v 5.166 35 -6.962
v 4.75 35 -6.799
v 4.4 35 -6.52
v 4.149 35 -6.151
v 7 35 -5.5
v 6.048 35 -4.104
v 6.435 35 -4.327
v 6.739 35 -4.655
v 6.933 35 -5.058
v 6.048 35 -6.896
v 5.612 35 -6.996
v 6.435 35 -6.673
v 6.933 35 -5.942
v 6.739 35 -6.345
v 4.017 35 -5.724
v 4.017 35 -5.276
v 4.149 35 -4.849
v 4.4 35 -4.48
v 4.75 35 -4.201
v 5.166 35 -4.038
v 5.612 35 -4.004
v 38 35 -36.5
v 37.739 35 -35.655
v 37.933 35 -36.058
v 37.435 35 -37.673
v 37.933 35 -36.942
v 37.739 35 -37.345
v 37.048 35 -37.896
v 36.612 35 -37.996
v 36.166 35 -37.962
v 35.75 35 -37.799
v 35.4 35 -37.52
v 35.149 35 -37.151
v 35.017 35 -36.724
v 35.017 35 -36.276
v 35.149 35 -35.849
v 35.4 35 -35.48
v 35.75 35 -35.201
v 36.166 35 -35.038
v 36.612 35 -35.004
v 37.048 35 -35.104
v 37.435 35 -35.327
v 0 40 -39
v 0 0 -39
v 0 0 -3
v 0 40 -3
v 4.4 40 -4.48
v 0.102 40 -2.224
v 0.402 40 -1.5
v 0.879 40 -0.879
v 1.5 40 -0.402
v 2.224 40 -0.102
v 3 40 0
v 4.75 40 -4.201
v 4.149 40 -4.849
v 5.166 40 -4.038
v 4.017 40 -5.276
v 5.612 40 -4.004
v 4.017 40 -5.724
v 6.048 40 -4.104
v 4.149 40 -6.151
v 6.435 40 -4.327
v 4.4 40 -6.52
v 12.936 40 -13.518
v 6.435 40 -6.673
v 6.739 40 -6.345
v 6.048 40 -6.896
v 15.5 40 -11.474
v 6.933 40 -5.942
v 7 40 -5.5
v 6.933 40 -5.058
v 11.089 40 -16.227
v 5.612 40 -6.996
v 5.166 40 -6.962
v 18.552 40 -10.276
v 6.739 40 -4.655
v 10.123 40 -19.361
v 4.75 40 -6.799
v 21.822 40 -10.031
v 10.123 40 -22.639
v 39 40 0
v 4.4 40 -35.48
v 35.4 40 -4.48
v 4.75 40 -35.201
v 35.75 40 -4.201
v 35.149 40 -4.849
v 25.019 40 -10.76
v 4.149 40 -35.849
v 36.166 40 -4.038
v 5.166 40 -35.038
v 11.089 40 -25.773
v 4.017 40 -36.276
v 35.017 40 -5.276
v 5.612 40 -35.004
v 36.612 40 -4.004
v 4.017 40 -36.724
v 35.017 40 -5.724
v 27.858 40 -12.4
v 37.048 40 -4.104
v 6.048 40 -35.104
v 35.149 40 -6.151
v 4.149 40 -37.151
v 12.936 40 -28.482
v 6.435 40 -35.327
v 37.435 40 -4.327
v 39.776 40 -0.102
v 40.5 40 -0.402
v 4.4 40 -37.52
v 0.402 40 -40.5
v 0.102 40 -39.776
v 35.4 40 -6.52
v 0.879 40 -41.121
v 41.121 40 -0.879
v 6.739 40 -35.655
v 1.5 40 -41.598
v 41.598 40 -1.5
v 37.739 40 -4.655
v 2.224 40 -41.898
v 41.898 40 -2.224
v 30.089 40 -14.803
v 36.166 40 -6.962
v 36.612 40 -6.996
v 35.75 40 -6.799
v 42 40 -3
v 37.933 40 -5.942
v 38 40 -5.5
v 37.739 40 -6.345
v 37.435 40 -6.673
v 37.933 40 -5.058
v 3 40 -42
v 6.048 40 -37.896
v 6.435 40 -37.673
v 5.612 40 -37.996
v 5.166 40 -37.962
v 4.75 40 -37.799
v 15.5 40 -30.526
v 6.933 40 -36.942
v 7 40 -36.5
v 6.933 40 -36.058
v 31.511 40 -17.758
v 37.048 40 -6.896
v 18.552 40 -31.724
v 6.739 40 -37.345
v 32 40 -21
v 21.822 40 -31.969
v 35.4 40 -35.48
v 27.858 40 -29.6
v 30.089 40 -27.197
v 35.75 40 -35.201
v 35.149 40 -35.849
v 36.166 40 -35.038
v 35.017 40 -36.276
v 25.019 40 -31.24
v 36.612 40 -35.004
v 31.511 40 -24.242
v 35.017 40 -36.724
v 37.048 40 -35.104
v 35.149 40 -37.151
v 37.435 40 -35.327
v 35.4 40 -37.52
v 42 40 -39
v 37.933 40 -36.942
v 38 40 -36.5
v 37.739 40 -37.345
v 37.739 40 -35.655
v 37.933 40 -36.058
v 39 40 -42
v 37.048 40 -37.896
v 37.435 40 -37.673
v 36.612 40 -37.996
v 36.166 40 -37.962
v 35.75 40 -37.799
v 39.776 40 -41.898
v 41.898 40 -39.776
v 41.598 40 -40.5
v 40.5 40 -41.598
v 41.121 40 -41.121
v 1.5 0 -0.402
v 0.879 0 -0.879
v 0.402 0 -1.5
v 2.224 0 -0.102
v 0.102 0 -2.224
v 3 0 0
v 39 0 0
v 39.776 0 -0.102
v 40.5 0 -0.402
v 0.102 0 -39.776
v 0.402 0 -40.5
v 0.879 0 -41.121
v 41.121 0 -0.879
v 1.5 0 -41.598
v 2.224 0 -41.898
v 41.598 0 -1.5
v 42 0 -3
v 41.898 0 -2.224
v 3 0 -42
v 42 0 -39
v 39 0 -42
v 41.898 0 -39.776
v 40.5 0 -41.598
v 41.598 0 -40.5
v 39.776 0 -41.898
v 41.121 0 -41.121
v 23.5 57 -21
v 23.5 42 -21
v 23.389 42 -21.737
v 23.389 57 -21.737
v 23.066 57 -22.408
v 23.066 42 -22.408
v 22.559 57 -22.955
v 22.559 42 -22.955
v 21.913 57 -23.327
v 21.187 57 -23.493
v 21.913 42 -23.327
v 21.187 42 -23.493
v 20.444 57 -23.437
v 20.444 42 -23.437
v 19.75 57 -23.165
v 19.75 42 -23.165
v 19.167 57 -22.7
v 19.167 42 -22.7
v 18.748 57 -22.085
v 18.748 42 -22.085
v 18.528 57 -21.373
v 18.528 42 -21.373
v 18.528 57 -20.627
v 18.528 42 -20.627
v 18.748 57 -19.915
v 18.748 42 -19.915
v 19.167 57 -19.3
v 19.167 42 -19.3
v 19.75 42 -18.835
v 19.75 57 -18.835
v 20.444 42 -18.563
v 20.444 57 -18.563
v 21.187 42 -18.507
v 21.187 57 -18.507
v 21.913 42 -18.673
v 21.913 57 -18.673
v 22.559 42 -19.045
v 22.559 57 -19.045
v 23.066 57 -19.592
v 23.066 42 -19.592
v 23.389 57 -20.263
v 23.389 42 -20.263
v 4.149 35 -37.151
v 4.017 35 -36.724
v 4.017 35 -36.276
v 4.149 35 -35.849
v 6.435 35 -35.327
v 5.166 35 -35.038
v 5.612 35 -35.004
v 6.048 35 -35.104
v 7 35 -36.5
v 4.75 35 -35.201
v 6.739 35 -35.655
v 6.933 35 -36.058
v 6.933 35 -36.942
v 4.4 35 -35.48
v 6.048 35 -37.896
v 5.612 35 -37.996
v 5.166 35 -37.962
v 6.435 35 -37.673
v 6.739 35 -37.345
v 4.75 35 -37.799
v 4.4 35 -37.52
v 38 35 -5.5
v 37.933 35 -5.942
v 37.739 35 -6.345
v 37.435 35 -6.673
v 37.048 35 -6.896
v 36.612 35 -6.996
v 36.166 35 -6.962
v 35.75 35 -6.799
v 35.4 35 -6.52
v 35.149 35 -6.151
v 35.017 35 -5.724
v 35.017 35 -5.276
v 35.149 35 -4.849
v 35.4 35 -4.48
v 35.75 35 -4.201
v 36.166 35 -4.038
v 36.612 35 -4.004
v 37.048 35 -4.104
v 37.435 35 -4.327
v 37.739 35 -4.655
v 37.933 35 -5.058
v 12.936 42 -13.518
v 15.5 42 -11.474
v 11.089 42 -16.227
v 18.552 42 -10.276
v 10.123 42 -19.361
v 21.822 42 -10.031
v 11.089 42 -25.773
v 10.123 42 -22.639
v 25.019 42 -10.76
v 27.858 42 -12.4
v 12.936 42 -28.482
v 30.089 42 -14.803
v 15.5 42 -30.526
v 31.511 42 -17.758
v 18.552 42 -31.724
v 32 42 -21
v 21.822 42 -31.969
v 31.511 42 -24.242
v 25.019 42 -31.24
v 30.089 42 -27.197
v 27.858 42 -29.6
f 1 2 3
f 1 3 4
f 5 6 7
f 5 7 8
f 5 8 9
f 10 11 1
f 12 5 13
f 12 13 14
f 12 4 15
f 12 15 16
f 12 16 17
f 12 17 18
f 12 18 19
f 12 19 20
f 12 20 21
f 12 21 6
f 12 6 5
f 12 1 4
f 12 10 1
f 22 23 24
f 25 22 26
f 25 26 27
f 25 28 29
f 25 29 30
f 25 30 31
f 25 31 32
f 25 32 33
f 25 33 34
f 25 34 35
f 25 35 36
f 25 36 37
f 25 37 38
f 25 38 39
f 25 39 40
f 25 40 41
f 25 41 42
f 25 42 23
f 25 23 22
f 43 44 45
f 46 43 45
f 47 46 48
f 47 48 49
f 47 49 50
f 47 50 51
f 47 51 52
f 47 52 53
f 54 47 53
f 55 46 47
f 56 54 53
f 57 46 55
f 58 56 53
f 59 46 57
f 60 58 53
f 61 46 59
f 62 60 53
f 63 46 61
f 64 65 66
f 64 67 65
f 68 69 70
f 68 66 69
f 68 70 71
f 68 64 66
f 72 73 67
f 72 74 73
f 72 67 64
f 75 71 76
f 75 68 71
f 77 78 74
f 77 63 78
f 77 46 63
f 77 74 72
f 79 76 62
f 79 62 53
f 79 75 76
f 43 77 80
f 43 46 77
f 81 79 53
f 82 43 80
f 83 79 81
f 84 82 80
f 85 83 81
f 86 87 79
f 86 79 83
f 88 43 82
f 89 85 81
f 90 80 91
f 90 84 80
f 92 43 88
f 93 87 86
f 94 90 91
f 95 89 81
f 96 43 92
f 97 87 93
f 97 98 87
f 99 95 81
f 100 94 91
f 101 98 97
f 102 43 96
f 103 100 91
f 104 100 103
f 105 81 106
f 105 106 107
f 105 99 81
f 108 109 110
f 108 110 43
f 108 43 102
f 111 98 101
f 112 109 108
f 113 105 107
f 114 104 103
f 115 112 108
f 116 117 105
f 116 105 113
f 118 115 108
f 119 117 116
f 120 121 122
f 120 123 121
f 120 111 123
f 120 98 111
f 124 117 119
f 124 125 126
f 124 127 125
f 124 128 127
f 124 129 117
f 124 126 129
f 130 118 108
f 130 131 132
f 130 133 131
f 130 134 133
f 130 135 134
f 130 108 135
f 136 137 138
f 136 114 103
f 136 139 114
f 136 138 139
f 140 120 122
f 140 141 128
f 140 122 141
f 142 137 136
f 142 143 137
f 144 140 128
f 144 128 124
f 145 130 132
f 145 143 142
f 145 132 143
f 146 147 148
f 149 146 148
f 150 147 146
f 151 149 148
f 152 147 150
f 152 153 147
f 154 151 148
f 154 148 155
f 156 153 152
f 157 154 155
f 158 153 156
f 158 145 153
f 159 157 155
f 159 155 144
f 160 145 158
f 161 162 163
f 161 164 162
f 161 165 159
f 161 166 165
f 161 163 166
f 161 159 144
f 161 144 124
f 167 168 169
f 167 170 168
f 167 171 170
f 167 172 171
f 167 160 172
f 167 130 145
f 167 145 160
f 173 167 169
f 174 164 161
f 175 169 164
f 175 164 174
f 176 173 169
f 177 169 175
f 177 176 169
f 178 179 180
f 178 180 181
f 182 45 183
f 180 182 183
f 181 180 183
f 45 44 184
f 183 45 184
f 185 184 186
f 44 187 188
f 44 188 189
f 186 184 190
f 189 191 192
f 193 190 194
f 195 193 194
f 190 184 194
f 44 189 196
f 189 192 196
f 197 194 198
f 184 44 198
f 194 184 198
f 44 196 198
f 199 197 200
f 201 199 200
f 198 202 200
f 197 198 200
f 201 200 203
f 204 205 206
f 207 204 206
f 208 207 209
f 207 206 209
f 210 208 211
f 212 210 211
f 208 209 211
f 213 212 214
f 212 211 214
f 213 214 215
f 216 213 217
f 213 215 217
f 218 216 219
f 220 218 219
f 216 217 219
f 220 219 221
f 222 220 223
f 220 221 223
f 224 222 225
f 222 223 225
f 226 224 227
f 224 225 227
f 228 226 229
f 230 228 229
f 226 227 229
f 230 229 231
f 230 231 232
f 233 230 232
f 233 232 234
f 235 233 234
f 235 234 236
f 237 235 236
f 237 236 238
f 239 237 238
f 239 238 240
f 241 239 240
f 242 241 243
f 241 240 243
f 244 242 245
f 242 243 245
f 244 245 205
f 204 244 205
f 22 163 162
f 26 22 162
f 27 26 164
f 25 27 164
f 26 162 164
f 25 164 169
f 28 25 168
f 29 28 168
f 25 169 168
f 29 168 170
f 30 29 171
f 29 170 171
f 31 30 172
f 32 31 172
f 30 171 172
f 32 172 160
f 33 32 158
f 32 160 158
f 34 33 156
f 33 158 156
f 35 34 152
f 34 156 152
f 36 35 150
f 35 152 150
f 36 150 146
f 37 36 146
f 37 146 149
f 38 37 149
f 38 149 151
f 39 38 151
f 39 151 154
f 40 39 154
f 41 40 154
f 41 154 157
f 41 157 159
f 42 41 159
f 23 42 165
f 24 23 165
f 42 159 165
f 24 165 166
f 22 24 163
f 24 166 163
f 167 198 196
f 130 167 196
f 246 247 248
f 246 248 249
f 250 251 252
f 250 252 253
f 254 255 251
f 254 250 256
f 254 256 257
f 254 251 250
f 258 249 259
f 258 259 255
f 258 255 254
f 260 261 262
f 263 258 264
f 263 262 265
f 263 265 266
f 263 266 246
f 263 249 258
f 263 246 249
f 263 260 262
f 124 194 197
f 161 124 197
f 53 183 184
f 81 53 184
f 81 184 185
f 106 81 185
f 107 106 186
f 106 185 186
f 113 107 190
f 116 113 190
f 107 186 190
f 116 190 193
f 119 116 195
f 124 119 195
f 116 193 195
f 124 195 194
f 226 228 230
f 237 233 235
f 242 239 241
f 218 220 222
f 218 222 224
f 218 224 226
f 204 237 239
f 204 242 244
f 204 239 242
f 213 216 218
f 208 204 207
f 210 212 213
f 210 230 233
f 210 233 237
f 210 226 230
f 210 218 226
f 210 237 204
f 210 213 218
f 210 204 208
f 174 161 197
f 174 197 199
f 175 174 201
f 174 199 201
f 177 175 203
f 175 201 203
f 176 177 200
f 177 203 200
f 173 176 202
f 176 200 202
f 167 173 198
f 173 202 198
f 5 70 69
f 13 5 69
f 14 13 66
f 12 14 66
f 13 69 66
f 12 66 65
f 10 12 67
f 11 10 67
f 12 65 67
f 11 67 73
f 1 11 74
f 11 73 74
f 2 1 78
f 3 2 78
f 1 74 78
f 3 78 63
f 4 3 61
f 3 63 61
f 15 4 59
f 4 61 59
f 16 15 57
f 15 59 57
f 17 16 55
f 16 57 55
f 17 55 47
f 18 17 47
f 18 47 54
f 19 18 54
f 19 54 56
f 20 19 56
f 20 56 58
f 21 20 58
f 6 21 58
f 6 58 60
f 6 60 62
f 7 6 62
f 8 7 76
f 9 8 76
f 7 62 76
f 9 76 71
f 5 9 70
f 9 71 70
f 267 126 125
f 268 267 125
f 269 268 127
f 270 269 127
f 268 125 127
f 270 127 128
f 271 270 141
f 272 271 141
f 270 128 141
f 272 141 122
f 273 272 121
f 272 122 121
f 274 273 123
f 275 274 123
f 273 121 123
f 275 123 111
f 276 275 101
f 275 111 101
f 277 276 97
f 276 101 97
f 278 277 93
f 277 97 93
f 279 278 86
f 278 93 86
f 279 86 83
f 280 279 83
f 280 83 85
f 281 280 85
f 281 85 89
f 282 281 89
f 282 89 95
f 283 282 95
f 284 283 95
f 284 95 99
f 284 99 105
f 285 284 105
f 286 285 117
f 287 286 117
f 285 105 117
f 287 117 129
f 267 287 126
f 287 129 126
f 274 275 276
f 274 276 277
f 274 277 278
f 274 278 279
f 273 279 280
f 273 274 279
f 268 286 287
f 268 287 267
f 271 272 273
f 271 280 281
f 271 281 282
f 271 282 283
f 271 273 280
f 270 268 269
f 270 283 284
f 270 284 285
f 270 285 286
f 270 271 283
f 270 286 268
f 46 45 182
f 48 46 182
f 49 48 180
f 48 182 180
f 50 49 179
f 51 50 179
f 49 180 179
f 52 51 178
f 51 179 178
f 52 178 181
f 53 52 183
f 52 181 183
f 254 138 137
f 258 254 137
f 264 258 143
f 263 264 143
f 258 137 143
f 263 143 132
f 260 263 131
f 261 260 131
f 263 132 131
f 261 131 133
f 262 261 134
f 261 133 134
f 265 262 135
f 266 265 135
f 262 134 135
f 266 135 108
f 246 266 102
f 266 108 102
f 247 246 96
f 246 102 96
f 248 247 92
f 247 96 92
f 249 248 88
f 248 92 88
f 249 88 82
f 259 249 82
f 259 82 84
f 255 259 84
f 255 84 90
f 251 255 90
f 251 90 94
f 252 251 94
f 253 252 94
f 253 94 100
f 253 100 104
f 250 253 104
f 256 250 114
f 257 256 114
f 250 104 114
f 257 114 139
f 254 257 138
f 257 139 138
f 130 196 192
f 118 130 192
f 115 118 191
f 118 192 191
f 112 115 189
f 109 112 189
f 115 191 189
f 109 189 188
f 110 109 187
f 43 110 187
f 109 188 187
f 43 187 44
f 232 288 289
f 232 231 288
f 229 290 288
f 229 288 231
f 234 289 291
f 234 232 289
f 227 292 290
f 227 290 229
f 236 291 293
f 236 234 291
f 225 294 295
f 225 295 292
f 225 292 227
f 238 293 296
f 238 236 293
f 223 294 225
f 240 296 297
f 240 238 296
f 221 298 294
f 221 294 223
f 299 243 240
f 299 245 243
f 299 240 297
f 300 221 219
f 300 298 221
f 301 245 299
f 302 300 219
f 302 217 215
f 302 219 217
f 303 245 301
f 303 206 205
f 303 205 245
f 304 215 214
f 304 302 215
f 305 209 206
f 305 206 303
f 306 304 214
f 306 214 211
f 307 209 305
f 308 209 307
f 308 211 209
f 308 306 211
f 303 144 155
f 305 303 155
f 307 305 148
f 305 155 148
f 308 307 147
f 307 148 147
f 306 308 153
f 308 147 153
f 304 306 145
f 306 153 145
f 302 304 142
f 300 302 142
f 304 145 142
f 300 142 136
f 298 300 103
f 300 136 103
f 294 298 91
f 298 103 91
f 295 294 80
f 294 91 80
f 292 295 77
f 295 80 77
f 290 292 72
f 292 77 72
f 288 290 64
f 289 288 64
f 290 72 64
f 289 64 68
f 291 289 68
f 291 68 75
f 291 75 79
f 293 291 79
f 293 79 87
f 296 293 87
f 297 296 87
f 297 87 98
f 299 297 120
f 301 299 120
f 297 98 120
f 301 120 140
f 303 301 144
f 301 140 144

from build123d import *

# Parameters (mm, degrees)
BOSS_EXTRUDE1_DEPTH = 40
SKETCH2_R           = 11
BOSS_EXTRUDE2_DEPTH = 2
SKETCH3_R           = 2.5
BOSS_EXTRUDE3_DEPTH = 15
SKETCH4_R           = 1.5
CUT_EXTRUDE1_DEPTH  = 5


with BuildPart() as part:
    # Sketch1 → Boss-Extrude1 (new body)
    with BuildSketch(Plane(origin=(0, 0, 0), x_dir=(1, 0, 0), z_dir=(0, 1, 0))):
        with BuildLine():
            Line((3, 0), (39, 0))
            ThreePointArc((39, 0), (41.121320344, 0.878679656), (42, 3))
            Line((42, 3), (42, 39))
            ThreePointArc((42, 39), (41.121320344, 41.121320344), (39, 42))
            Line((39, 42), (3, 42))
            ThreePointArc((3, 42), (0.878679656, 41.121320344), (0, 39))
            Line((0, 39), (0, 3))
            ThreePointArc((0, 3), (0.878679656, 0.878679656), (3, 0))
        make_face()
    extrude(amount=BOSS_EXTRUDE1_DEPTH)

    # Sketch2 → Boss-Extrude2 (add)
    with BuildSketch(Plane(origin=(0, 40, 0), x_dir=(1, 0, 0), z_dir=(0, 1, 0))):
        with Locations((21, 21)):
            Circle(SKETCH2_R)
    extrude(amount=BOSS_EXTRUDE2_DEPTH)

    # Sketch3 → Boss-Extrude3 (add)
    with BuildSketch(Plane(origin=(0, 42, 0), x_dir=(1, 0, 0), z_dir=(0, 1, 0))):
        with Locations((21, 21)):
            Circle(SKETCH3_R)
    extrude(amount=BOSS_EXTRUDE3_DEPTH)

    # Sketch4 → Cut-Extrude1 (cut)
    with BuildSketch(Plane(origin=(0, 40, 0), x_dir=(1, 0, 0), z_dir=(0, 1, 0))):
        with Locations((5.5, 36.5)):
            Circle(SKETCH4_R)
        with Locations((36.5, 36.5)):
            Circle(SKETCH4_R)
        with Locations((36.5, 5.5)):
            Circle(SKETCH4_R)
        with Locations((5.5, 5.5)):
            Circle(SKETCH4_R)
    extrude(amount=-CUT_EXTRUDE1_DEPTH, mode=Mode.SUBTRACT)


solid = part.part
